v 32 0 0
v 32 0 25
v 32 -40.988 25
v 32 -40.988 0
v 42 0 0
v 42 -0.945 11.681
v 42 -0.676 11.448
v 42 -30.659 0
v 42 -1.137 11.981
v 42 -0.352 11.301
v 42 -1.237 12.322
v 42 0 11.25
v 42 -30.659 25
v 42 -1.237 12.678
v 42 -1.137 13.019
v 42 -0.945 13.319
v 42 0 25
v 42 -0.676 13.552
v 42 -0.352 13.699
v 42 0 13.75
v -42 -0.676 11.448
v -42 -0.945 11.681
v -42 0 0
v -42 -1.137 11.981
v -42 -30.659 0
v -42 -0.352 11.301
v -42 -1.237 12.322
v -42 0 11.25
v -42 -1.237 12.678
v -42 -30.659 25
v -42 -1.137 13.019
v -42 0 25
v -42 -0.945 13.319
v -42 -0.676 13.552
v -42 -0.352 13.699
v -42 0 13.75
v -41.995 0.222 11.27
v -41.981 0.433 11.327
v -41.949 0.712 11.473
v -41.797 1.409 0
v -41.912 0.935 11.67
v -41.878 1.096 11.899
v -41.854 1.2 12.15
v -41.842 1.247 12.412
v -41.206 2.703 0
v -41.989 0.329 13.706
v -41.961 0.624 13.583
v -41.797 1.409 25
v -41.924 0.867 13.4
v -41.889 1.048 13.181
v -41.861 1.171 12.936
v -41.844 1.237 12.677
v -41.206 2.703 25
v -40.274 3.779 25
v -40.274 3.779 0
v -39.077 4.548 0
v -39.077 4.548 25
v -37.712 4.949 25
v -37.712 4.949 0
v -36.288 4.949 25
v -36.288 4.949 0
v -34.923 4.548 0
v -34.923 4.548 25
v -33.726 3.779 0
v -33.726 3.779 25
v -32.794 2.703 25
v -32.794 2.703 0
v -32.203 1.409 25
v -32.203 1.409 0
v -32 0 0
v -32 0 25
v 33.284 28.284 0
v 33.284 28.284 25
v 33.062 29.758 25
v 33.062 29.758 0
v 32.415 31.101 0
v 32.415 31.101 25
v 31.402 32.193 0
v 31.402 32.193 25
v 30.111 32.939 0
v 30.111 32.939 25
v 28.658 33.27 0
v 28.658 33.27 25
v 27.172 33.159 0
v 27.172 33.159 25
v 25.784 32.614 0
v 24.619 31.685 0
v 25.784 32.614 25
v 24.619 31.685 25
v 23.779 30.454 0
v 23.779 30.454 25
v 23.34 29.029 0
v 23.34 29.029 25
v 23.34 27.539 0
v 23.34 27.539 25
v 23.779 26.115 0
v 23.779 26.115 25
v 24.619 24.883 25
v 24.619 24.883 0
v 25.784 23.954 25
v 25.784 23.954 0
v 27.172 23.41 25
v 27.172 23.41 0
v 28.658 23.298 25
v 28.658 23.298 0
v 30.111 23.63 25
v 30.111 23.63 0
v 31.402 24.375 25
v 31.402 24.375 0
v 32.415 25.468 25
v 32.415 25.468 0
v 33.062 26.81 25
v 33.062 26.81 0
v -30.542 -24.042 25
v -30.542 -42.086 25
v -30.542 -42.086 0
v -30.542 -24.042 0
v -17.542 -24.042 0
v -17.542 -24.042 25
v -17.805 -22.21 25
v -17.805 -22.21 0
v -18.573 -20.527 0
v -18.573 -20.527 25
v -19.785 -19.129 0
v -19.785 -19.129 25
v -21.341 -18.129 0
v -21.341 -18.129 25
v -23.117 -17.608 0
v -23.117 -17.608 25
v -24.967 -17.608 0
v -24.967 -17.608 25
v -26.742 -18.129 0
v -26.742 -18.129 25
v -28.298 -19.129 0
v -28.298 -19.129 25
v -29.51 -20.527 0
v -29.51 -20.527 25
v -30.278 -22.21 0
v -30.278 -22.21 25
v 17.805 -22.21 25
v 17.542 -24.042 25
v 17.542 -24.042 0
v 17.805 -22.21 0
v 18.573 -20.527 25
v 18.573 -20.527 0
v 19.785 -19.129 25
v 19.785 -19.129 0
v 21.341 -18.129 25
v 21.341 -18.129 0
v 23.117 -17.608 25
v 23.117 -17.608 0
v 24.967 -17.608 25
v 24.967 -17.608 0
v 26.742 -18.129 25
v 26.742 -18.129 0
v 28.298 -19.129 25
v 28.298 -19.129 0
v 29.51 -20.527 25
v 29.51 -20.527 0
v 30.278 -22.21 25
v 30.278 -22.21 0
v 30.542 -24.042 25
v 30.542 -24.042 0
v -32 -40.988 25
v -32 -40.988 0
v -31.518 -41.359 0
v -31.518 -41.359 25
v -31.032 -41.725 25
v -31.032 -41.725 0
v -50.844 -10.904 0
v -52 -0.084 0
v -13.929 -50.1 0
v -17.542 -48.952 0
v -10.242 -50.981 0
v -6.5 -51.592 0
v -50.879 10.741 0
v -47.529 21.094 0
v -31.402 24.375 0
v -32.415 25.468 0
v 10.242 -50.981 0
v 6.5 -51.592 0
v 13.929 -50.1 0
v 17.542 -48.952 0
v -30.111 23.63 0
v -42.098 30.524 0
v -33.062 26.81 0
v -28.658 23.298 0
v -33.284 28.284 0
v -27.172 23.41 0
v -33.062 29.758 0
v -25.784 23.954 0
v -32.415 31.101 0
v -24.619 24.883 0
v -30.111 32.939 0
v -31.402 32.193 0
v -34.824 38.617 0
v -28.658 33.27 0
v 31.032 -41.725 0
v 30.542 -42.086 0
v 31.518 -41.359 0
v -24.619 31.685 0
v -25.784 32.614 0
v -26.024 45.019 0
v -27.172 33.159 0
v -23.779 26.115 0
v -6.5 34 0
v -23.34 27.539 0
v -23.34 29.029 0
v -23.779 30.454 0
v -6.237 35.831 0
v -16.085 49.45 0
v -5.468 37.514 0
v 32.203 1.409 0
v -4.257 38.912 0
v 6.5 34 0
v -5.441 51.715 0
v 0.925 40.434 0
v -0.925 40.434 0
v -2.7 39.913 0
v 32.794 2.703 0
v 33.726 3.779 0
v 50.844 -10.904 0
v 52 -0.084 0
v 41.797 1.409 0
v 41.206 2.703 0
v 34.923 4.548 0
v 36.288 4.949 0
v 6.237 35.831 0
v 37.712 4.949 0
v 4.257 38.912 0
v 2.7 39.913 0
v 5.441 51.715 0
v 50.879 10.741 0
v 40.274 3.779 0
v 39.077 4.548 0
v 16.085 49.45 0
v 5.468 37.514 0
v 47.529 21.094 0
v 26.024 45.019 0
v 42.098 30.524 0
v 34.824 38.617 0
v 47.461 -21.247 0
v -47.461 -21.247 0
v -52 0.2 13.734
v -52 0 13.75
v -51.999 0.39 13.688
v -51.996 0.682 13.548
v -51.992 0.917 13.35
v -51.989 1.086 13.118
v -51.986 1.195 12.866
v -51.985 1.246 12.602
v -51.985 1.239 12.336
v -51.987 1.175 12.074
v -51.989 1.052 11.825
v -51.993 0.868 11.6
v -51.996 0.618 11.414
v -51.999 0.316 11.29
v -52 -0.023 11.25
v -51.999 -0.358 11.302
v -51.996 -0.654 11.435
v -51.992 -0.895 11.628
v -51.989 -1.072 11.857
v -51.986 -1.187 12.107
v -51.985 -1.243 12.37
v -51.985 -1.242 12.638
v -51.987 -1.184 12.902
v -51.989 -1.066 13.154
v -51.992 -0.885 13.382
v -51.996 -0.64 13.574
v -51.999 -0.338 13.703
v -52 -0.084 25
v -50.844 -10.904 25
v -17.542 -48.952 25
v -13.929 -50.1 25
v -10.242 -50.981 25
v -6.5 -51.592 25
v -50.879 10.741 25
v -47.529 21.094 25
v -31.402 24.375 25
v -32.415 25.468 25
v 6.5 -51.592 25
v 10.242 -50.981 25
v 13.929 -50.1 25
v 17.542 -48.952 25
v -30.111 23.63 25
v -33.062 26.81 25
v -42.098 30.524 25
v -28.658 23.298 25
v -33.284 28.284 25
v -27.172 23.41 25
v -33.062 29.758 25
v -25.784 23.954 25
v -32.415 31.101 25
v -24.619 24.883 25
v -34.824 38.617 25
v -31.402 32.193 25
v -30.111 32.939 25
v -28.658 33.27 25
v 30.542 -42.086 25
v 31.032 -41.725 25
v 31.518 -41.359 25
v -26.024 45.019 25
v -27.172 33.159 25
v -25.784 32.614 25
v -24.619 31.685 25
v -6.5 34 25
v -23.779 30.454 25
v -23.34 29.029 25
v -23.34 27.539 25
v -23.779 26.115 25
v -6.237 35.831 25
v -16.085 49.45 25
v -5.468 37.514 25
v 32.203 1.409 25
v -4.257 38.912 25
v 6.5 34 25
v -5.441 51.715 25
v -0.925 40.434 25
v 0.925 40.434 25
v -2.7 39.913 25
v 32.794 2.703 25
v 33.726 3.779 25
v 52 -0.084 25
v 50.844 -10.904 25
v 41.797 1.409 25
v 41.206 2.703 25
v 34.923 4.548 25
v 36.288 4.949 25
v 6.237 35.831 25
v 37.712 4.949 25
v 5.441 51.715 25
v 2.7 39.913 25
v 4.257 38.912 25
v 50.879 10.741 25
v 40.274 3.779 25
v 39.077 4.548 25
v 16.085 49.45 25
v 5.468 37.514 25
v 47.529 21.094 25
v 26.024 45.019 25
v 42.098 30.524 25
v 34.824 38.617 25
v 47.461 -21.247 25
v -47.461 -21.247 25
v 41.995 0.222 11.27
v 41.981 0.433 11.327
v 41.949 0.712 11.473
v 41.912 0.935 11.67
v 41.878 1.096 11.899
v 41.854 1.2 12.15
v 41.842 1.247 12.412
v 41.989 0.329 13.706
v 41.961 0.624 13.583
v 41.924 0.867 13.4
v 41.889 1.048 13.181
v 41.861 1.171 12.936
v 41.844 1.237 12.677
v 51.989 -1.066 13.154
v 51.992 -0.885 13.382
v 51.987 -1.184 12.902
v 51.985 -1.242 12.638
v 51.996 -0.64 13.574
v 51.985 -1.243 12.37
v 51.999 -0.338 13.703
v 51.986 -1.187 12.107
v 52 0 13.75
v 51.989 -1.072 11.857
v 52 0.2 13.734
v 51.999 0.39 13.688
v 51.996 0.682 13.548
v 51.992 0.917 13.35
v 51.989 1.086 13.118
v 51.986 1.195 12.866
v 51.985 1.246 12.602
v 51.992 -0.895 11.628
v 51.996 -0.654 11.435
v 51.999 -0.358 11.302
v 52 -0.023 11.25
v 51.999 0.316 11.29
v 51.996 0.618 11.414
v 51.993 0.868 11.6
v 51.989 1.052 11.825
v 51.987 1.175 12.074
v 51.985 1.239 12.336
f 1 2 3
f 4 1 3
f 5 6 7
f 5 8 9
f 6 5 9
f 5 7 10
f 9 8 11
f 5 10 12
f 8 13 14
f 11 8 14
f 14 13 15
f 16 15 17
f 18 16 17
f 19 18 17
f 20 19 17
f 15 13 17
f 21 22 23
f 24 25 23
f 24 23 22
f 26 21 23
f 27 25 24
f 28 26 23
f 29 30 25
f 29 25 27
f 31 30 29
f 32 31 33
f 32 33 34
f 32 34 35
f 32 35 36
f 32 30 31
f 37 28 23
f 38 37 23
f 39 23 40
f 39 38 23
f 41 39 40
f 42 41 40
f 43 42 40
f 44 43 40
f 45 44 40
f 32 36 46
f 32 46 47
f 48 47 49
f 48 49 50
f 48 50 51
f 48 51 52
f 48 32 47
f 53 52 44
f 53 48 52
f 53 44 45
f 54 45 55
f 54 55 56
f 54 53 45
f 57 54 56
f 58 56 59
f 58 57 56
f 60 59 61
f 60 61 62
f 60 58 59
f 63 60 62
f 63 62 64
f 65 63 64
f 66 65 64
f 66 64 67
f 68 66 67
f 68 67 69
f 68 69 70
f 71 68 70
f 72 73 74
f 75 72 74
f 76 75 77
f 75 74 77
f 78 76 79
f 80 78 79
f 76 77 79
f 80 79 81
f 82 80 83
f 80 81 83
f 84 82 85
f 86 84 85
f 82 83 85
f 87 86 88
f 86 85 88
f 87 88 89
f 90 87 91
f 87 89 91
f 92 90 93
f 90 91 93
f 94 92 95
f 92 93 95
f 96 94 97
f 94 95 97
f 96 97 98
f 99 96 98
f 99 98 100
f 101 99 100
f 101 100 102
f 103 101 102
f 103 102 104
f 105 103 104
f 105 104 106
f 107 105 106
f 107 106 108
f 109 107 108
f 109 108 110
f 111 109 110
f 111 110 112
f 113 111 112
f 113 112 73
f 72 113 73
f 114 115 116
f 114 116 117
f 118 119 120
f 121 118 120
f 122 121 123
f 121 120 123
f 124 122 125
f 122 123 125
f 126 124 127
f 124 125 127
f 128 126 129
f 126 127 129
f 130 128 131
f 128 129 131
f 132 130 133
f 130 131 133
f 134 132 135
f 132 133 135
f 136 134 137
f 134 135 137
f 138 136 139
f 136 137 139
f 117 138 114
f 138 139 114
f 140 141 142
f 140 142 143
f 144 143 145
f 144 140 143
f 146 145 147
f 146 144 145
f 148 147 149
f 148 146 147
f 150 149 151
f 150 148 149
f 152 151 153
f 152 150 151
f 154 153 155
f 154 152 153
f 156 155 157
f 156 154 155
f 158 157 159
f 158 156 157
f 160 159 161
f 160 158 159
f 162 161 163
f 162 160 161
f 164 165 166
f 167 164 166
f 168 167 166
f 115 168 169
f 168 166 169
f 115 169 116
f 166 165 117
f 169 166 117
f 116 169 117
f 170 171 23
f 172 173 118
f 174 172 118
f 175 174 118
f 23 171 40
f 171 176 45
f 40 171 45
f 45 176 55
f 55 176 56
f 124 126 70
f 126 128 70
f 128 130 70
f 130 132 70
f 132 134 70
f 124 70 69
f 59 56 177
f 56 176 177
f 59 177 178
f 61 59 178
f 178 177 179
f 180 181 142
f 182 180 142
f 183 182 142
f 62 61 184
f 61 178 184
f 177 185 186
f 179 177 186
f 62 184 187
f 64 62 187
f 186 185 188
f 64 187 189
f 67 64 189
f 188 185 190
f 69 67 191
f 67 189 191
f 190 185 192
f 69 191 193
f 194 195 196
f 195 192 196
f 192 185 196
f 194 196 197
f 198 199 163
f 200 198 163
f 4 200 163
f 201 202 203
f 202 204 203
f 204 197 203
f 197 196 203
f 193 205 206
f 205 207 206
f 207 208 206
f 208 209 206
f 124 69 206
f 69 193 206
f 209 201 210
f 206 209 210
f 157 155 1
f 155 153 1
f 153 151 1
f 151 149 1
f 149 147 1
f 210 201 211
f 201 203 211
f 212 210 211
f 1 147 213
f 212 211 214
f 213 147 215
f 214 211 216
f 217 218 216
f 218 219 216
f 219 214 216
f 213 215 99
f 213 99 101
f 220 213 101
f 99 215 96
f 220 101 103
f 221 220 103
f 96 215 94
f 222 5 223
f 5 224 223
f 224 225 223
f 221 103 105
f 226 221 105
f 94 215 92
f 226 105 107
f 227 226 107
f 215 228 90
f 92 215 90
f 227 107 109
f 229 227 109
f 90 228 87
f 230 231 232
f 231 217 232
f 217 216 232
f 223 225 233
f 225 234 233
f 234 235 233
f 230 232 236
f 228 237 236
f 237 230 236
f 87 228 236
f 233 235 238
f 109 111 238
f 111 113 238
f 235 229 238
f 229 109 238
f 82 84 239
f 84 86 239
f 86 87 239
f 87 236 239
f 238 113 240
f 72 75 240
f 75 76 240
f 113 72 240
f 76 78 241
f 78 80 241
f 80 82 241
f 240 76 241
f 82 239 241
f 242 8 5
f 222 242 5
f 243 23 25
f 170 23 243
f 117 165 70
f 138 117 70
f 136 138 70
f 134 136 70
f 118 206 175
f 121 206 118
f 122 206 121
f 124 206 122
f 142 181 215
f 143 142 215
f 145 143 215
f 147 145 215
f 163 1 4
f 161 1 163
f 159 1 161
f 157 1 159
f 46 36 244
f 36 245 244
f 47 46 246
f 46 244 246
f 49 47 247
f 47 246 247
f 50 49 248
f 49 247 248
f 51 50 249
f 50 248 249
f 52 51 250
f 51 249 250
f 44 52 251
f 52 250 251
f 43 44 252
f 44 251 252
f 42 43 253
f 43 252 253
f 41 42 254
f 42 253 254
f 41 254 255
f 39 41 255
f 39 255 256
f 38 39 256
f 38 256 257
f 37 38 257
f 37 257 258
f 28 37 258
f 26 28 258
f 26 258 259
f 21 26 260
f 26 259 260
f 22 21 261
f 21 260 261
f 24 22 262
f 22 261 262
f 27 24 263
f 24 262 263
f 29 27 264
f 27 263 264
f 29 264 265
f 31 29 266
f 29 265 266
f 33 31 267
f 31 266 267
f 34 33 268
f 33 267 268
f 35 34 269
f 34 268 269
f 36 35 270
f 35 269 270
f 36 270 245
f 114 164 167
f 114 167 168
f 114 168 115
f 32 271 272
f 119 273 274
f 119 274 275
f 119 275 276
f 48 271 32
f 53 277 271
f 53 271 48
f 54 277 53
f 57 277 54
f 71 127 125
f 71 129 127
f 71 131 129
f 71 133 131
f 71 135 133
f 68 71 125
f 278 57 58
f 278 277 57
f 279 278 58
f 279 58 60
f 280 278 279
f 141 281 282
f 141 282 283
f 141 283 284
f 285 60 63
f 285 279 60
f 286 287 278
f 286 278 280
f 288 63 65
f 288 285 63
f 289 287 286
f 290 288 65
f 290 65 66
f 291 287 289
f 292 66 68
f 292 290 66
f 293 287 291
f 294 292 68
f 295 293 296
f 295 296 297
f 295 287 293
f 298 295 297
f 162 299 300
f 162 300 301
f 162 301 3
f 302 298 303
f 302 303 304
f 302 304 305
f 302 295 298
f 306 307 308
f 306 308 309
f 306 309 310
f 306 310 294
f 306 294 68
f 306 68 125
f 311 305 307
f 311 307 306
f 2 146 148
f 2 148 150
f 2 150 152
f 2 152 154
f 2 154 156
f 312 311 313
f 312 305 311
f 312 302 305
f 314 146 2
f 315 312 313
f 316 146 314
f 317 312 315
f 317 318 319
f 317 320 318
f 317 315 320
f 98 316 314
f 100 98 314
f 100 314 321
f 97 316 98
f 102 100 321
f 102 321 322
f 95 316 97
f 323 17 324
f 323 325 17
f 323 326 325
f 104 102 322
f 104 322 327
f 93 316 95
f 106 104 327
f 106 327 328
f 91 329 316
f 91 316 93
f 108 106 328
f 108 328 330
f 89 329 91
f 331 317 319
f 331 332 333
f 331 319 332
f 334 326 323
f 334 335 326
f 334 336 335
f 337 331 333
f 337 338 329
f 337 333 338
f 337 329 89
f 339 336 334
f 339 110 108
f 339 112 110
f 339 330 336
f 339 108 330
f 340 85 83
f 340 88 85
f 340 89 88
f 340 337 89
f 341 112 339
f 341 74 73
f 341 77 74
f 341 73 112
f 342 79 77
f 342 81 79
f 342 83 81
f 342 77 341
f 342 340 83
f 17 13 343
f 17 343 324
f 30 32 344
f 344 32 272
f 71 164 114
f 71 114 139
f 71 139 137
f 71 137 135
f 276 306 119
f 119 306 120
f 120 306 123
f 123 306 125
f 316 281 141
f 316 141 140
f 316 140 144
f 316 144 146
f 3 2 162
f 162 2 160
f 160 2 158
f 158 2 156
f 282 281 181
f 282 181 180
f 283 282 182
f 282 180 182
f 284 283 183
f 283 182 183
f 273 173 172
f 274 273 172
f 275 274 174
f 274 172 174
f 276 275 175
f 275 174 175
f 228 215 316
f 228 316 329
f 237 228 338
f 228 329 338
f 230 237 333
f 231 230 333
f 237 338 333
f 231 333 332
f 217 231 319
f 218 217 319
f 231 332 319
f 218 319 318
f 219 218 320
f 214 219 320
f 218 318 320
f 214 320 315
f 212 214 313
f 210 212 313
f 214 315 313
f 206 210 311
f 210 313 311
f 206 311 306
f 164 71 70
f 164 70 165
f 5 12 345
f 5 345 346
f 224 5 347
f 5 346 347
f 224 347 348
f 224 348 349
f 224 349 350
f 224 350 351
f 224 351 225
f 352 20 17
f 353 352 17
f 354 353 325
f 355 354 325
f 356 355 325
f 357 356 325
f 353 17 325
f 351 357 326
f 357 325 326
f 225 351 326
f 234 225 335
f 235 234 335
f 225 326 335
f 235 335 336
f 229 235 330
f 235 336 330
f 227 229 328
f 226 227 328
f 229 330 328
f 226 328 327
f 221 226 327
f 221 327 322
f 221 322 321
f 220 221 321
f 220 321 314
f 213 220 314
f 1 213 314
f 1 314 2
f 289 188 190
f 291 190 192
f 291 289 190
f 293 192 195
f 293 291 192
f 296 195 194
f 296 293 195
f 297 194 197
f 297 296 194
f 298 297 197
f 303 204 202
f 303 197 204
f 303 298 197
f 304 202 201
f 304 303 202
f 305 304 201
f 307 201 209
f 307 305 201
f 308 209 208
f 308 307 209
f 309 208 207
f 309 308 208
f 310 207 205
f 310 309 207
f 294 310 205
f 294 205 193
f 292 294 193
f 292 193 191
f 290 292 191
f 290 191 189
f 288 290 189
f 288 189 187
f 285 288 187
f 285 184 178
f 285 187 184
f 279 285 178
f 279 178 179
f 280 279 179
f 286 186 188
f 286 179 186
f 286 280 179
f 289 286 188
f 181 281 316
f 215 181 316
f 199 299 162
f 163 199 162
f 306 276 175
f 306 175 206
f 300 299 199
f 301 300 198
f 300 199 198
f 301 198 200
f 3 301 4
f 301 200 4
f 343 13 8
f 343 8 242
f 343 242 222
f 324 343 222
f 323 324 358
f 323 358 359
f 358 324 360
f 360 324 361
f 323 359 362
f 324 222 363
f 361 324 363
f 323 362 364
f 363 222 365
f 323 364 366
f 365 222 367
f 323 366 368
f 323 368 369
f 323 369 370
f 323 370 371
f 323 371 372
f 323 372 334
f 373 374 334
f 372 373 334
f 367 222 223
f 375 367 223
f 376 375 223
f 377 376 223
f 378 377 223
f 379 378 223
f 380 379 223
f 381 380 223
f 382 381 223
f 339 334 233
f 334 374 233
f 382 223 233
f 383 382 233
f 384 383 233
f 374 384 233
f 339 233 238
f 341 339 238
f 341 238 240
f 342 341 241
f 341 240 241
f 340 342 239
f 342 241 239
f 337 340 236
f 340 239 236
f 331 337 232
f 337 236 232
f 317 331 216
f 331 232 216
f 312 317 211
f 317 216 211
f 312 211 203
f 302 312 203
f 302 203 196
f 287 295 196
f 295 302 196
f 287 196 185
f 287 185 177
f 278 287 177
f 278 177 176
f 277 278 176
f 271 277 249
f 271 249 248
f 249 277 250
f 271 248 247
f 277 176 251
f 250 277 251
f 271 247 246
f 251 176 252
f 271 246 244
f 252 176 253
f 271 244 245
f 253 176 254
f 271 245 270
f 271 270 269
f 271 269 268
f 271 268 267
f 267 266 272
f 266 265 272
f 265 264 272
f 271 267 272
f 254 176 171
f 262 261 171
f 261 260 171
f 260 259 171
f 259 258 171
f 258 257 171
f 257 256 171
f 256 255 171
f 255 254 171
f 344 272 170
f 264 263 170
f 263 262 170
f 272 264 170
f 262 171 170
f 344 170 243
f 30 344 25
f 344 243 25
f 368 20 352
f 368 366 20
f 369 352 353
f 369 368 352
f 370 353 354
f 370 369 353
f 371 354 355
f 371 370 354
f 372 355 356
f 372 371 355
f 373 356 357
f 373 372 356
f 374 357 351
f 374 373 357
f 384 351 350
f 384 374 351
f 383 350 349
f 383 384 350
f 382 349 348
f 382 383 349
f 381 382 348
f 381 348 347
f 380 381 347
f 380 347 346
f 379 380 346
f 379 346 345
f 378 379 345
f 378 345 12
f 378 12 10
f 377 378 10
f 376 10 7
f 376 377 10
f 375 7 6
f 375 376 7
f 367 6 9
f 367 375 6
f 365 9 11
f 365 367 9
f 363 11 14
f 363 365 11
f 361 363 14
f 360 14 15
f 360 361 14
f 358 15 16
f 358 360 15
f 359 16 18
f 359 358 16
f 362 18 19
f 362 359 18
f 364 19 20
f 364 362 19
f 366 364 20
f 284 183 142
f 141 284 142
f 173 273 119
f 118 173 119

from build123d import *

# Parameters (mm, degrees)
SKETCH1_R              = 52
BOSS_EXTRUDE1_DEPTH    = 25
CUT_EXTRUDE1_DEPTH     = 25
SKETCH3_R              = 6.5
CUT_EXTRUDE2_DEPTH     = 30
SKETCH5_R              = 6.5
CUT_EXTRUDE3_DEPTH     = 30
SKETCH6_W              = 13
SKETCH6_H              = 90.106241662
SKETCH6_H_2            = 26.210700472
SKETCH6_H_3            = 29.761182449
CUT_EXTRUDE4_DEPTH     = 30
M3_TAPPED_HOLE1_REACH  = 120.933
M3_TAPPED_HOLE1_BORE_R = 1.25
SKETCH10_R             = 5
CUT_EXTRUDE5_DEPTH     = 30


with BuildPart() as part:
    # Sketch1 → Boss-Extrude1 (new body)
    with BuildSketch(Plane.XY):
        Circle(SKETCH1_R)
    extrude(amount=BOSS_EXTRUDE1_DEPTH)

    # Sketch2 → Cut-Extrude1 (cut)
    with BuildSketch(Plane.XY.offset(25)):
        with BuildLine():
            Line((32, 0), (32, -45))
            Line((32, -45), (42, -45))
            Line((42, -45), (42, 3.54e-07))
            ThreePointArc((42, 3.54e-07), (36.999999823, 5), (32, 0))
        make_face()
        with BuildLine():
            Line((-5, -39.999999646), (-5, -55))
            Line((-5, -55), (5, -55))
            Line((5, -55), (5, -40))
            ThreePointArc((5, -40), (1.77e-07, -35), (-5, -39.999999646))
        make_face()
        with BuildLine():
            Line((-32, -45), (-42, -45))
            Line((-42, -45), (-42, 3.54e-07))
            ThreePointArc((-42, 3.54e-07), (-36.999999823, 5), (-32, 0))
            Line((-32, 0), (-32, -45))
        make_face()
    extrude(amount=-CUT_EXTRUDE1_DEPTH, mode=Mode.SUBTRACT)

    # Sketch3 → Cut-Extrude2 (cut)
    with BuildSketch(Plane.XY.offset(25)):
        with Locations((0, 34)):
            Circle(SKETCH3_R)
    extrude(amount=-CUT_EXTRUDE2_DEPTH, mode=Mode.SUBTRACT)

    # Sketch5 → Cut-Extrude3 (cut)
    with BuildSketch(Plane.XY.offset(25)):
        with Locations((-24.04163056, -24.04163056)):
            Circle(SKETCH5_R)
    cut_extrude3 = extrude(amount=-CUT_EXTRUDE3_DEPTH, mode=Mode.SUBTRACT)

    # Mirror1: Cut-Extrude3 across plane
    add(cut_extrude3.mirror(Plane(origin=(0, 0, 0), x_dir=(0, 0, 1), z_dir=(1, 0, 0))), mode=Mode.SUBTRACT)

    # Sketch6 → Cut-Extrude4 (cut)
    with BuildSketch(Plane.XY.offset(25)):
        with Locations((0, -11.053120831)):
            Rectangle(SKETCH6_W, SKETCH6_H)
        with Locations((24.04163056, -37.146980796)):
            Rectangle(SKETCH6_W, SKETCH6_H_2)
        with Locations((-24.04163056, -38.922221785)):
            Rectangle(SKETCH6_W, SKETCH6_H_3)
    extrude(amount=-CUT_EXTRUDE4_DEPTH, mode=Mode.SUBTRACT)

    # M3 Tapped Hole1 bore → M3 Tapped Hole1 (cut, up to next)
    with BuildSketch(Plane.ZY.offset(52), mode=Mode.PRIVATE) as m3_tapped_hole1_sk1:
        with Locations((12.5, 0)):
            Circle(M3_TAPPED_HOLE1_BORE_R)
    m3_tapped_hole1_tool1 = extrude(m3_tapped_hole1_sk1.sketch, amount=-M3_TAPPED_HOLE1_REACH, mode=Mode.PRIVATE) & part.part
    m3_tapped_hole1 = m3_tapped_hole1_tool1.solids().sort_by_distance((-52, 0, 12.5))[0]
    add(m3_tapped_hole1, mode=Mode.SUBTRACT)

    # Mirror2: M3 Tapped Hole1 across plane
    add(m3_tapped_hole1.mirror(Plane(origin=(0, 0, 0), x_dir=(0, 0, 1), z_dir=(1, 0, 0))), mode=Mode.SUBTRACT)

    # Sketch10 → Cut-Extrude5 (cut)
    with BuildSketch(Plane.XY.offset(25)):
        with Locations((28.284271247, 28.284271247)):
            Circle(SKETCH10_R)
    cut_extrude5 = extrude(amount=-CUT_EXTRUDE5_DEPTH, mode=Mode.SUBTRACT)

    # Mirror3: Cut-Extrude5 across plane
    add(cut_extrude5.mirror(Plane(origin=(0, 0, 0), x_dir=(0, 0, 1), z_dir=(1, 0, 0))), mode=Mode.SUBTRACT)


solid = part.part
